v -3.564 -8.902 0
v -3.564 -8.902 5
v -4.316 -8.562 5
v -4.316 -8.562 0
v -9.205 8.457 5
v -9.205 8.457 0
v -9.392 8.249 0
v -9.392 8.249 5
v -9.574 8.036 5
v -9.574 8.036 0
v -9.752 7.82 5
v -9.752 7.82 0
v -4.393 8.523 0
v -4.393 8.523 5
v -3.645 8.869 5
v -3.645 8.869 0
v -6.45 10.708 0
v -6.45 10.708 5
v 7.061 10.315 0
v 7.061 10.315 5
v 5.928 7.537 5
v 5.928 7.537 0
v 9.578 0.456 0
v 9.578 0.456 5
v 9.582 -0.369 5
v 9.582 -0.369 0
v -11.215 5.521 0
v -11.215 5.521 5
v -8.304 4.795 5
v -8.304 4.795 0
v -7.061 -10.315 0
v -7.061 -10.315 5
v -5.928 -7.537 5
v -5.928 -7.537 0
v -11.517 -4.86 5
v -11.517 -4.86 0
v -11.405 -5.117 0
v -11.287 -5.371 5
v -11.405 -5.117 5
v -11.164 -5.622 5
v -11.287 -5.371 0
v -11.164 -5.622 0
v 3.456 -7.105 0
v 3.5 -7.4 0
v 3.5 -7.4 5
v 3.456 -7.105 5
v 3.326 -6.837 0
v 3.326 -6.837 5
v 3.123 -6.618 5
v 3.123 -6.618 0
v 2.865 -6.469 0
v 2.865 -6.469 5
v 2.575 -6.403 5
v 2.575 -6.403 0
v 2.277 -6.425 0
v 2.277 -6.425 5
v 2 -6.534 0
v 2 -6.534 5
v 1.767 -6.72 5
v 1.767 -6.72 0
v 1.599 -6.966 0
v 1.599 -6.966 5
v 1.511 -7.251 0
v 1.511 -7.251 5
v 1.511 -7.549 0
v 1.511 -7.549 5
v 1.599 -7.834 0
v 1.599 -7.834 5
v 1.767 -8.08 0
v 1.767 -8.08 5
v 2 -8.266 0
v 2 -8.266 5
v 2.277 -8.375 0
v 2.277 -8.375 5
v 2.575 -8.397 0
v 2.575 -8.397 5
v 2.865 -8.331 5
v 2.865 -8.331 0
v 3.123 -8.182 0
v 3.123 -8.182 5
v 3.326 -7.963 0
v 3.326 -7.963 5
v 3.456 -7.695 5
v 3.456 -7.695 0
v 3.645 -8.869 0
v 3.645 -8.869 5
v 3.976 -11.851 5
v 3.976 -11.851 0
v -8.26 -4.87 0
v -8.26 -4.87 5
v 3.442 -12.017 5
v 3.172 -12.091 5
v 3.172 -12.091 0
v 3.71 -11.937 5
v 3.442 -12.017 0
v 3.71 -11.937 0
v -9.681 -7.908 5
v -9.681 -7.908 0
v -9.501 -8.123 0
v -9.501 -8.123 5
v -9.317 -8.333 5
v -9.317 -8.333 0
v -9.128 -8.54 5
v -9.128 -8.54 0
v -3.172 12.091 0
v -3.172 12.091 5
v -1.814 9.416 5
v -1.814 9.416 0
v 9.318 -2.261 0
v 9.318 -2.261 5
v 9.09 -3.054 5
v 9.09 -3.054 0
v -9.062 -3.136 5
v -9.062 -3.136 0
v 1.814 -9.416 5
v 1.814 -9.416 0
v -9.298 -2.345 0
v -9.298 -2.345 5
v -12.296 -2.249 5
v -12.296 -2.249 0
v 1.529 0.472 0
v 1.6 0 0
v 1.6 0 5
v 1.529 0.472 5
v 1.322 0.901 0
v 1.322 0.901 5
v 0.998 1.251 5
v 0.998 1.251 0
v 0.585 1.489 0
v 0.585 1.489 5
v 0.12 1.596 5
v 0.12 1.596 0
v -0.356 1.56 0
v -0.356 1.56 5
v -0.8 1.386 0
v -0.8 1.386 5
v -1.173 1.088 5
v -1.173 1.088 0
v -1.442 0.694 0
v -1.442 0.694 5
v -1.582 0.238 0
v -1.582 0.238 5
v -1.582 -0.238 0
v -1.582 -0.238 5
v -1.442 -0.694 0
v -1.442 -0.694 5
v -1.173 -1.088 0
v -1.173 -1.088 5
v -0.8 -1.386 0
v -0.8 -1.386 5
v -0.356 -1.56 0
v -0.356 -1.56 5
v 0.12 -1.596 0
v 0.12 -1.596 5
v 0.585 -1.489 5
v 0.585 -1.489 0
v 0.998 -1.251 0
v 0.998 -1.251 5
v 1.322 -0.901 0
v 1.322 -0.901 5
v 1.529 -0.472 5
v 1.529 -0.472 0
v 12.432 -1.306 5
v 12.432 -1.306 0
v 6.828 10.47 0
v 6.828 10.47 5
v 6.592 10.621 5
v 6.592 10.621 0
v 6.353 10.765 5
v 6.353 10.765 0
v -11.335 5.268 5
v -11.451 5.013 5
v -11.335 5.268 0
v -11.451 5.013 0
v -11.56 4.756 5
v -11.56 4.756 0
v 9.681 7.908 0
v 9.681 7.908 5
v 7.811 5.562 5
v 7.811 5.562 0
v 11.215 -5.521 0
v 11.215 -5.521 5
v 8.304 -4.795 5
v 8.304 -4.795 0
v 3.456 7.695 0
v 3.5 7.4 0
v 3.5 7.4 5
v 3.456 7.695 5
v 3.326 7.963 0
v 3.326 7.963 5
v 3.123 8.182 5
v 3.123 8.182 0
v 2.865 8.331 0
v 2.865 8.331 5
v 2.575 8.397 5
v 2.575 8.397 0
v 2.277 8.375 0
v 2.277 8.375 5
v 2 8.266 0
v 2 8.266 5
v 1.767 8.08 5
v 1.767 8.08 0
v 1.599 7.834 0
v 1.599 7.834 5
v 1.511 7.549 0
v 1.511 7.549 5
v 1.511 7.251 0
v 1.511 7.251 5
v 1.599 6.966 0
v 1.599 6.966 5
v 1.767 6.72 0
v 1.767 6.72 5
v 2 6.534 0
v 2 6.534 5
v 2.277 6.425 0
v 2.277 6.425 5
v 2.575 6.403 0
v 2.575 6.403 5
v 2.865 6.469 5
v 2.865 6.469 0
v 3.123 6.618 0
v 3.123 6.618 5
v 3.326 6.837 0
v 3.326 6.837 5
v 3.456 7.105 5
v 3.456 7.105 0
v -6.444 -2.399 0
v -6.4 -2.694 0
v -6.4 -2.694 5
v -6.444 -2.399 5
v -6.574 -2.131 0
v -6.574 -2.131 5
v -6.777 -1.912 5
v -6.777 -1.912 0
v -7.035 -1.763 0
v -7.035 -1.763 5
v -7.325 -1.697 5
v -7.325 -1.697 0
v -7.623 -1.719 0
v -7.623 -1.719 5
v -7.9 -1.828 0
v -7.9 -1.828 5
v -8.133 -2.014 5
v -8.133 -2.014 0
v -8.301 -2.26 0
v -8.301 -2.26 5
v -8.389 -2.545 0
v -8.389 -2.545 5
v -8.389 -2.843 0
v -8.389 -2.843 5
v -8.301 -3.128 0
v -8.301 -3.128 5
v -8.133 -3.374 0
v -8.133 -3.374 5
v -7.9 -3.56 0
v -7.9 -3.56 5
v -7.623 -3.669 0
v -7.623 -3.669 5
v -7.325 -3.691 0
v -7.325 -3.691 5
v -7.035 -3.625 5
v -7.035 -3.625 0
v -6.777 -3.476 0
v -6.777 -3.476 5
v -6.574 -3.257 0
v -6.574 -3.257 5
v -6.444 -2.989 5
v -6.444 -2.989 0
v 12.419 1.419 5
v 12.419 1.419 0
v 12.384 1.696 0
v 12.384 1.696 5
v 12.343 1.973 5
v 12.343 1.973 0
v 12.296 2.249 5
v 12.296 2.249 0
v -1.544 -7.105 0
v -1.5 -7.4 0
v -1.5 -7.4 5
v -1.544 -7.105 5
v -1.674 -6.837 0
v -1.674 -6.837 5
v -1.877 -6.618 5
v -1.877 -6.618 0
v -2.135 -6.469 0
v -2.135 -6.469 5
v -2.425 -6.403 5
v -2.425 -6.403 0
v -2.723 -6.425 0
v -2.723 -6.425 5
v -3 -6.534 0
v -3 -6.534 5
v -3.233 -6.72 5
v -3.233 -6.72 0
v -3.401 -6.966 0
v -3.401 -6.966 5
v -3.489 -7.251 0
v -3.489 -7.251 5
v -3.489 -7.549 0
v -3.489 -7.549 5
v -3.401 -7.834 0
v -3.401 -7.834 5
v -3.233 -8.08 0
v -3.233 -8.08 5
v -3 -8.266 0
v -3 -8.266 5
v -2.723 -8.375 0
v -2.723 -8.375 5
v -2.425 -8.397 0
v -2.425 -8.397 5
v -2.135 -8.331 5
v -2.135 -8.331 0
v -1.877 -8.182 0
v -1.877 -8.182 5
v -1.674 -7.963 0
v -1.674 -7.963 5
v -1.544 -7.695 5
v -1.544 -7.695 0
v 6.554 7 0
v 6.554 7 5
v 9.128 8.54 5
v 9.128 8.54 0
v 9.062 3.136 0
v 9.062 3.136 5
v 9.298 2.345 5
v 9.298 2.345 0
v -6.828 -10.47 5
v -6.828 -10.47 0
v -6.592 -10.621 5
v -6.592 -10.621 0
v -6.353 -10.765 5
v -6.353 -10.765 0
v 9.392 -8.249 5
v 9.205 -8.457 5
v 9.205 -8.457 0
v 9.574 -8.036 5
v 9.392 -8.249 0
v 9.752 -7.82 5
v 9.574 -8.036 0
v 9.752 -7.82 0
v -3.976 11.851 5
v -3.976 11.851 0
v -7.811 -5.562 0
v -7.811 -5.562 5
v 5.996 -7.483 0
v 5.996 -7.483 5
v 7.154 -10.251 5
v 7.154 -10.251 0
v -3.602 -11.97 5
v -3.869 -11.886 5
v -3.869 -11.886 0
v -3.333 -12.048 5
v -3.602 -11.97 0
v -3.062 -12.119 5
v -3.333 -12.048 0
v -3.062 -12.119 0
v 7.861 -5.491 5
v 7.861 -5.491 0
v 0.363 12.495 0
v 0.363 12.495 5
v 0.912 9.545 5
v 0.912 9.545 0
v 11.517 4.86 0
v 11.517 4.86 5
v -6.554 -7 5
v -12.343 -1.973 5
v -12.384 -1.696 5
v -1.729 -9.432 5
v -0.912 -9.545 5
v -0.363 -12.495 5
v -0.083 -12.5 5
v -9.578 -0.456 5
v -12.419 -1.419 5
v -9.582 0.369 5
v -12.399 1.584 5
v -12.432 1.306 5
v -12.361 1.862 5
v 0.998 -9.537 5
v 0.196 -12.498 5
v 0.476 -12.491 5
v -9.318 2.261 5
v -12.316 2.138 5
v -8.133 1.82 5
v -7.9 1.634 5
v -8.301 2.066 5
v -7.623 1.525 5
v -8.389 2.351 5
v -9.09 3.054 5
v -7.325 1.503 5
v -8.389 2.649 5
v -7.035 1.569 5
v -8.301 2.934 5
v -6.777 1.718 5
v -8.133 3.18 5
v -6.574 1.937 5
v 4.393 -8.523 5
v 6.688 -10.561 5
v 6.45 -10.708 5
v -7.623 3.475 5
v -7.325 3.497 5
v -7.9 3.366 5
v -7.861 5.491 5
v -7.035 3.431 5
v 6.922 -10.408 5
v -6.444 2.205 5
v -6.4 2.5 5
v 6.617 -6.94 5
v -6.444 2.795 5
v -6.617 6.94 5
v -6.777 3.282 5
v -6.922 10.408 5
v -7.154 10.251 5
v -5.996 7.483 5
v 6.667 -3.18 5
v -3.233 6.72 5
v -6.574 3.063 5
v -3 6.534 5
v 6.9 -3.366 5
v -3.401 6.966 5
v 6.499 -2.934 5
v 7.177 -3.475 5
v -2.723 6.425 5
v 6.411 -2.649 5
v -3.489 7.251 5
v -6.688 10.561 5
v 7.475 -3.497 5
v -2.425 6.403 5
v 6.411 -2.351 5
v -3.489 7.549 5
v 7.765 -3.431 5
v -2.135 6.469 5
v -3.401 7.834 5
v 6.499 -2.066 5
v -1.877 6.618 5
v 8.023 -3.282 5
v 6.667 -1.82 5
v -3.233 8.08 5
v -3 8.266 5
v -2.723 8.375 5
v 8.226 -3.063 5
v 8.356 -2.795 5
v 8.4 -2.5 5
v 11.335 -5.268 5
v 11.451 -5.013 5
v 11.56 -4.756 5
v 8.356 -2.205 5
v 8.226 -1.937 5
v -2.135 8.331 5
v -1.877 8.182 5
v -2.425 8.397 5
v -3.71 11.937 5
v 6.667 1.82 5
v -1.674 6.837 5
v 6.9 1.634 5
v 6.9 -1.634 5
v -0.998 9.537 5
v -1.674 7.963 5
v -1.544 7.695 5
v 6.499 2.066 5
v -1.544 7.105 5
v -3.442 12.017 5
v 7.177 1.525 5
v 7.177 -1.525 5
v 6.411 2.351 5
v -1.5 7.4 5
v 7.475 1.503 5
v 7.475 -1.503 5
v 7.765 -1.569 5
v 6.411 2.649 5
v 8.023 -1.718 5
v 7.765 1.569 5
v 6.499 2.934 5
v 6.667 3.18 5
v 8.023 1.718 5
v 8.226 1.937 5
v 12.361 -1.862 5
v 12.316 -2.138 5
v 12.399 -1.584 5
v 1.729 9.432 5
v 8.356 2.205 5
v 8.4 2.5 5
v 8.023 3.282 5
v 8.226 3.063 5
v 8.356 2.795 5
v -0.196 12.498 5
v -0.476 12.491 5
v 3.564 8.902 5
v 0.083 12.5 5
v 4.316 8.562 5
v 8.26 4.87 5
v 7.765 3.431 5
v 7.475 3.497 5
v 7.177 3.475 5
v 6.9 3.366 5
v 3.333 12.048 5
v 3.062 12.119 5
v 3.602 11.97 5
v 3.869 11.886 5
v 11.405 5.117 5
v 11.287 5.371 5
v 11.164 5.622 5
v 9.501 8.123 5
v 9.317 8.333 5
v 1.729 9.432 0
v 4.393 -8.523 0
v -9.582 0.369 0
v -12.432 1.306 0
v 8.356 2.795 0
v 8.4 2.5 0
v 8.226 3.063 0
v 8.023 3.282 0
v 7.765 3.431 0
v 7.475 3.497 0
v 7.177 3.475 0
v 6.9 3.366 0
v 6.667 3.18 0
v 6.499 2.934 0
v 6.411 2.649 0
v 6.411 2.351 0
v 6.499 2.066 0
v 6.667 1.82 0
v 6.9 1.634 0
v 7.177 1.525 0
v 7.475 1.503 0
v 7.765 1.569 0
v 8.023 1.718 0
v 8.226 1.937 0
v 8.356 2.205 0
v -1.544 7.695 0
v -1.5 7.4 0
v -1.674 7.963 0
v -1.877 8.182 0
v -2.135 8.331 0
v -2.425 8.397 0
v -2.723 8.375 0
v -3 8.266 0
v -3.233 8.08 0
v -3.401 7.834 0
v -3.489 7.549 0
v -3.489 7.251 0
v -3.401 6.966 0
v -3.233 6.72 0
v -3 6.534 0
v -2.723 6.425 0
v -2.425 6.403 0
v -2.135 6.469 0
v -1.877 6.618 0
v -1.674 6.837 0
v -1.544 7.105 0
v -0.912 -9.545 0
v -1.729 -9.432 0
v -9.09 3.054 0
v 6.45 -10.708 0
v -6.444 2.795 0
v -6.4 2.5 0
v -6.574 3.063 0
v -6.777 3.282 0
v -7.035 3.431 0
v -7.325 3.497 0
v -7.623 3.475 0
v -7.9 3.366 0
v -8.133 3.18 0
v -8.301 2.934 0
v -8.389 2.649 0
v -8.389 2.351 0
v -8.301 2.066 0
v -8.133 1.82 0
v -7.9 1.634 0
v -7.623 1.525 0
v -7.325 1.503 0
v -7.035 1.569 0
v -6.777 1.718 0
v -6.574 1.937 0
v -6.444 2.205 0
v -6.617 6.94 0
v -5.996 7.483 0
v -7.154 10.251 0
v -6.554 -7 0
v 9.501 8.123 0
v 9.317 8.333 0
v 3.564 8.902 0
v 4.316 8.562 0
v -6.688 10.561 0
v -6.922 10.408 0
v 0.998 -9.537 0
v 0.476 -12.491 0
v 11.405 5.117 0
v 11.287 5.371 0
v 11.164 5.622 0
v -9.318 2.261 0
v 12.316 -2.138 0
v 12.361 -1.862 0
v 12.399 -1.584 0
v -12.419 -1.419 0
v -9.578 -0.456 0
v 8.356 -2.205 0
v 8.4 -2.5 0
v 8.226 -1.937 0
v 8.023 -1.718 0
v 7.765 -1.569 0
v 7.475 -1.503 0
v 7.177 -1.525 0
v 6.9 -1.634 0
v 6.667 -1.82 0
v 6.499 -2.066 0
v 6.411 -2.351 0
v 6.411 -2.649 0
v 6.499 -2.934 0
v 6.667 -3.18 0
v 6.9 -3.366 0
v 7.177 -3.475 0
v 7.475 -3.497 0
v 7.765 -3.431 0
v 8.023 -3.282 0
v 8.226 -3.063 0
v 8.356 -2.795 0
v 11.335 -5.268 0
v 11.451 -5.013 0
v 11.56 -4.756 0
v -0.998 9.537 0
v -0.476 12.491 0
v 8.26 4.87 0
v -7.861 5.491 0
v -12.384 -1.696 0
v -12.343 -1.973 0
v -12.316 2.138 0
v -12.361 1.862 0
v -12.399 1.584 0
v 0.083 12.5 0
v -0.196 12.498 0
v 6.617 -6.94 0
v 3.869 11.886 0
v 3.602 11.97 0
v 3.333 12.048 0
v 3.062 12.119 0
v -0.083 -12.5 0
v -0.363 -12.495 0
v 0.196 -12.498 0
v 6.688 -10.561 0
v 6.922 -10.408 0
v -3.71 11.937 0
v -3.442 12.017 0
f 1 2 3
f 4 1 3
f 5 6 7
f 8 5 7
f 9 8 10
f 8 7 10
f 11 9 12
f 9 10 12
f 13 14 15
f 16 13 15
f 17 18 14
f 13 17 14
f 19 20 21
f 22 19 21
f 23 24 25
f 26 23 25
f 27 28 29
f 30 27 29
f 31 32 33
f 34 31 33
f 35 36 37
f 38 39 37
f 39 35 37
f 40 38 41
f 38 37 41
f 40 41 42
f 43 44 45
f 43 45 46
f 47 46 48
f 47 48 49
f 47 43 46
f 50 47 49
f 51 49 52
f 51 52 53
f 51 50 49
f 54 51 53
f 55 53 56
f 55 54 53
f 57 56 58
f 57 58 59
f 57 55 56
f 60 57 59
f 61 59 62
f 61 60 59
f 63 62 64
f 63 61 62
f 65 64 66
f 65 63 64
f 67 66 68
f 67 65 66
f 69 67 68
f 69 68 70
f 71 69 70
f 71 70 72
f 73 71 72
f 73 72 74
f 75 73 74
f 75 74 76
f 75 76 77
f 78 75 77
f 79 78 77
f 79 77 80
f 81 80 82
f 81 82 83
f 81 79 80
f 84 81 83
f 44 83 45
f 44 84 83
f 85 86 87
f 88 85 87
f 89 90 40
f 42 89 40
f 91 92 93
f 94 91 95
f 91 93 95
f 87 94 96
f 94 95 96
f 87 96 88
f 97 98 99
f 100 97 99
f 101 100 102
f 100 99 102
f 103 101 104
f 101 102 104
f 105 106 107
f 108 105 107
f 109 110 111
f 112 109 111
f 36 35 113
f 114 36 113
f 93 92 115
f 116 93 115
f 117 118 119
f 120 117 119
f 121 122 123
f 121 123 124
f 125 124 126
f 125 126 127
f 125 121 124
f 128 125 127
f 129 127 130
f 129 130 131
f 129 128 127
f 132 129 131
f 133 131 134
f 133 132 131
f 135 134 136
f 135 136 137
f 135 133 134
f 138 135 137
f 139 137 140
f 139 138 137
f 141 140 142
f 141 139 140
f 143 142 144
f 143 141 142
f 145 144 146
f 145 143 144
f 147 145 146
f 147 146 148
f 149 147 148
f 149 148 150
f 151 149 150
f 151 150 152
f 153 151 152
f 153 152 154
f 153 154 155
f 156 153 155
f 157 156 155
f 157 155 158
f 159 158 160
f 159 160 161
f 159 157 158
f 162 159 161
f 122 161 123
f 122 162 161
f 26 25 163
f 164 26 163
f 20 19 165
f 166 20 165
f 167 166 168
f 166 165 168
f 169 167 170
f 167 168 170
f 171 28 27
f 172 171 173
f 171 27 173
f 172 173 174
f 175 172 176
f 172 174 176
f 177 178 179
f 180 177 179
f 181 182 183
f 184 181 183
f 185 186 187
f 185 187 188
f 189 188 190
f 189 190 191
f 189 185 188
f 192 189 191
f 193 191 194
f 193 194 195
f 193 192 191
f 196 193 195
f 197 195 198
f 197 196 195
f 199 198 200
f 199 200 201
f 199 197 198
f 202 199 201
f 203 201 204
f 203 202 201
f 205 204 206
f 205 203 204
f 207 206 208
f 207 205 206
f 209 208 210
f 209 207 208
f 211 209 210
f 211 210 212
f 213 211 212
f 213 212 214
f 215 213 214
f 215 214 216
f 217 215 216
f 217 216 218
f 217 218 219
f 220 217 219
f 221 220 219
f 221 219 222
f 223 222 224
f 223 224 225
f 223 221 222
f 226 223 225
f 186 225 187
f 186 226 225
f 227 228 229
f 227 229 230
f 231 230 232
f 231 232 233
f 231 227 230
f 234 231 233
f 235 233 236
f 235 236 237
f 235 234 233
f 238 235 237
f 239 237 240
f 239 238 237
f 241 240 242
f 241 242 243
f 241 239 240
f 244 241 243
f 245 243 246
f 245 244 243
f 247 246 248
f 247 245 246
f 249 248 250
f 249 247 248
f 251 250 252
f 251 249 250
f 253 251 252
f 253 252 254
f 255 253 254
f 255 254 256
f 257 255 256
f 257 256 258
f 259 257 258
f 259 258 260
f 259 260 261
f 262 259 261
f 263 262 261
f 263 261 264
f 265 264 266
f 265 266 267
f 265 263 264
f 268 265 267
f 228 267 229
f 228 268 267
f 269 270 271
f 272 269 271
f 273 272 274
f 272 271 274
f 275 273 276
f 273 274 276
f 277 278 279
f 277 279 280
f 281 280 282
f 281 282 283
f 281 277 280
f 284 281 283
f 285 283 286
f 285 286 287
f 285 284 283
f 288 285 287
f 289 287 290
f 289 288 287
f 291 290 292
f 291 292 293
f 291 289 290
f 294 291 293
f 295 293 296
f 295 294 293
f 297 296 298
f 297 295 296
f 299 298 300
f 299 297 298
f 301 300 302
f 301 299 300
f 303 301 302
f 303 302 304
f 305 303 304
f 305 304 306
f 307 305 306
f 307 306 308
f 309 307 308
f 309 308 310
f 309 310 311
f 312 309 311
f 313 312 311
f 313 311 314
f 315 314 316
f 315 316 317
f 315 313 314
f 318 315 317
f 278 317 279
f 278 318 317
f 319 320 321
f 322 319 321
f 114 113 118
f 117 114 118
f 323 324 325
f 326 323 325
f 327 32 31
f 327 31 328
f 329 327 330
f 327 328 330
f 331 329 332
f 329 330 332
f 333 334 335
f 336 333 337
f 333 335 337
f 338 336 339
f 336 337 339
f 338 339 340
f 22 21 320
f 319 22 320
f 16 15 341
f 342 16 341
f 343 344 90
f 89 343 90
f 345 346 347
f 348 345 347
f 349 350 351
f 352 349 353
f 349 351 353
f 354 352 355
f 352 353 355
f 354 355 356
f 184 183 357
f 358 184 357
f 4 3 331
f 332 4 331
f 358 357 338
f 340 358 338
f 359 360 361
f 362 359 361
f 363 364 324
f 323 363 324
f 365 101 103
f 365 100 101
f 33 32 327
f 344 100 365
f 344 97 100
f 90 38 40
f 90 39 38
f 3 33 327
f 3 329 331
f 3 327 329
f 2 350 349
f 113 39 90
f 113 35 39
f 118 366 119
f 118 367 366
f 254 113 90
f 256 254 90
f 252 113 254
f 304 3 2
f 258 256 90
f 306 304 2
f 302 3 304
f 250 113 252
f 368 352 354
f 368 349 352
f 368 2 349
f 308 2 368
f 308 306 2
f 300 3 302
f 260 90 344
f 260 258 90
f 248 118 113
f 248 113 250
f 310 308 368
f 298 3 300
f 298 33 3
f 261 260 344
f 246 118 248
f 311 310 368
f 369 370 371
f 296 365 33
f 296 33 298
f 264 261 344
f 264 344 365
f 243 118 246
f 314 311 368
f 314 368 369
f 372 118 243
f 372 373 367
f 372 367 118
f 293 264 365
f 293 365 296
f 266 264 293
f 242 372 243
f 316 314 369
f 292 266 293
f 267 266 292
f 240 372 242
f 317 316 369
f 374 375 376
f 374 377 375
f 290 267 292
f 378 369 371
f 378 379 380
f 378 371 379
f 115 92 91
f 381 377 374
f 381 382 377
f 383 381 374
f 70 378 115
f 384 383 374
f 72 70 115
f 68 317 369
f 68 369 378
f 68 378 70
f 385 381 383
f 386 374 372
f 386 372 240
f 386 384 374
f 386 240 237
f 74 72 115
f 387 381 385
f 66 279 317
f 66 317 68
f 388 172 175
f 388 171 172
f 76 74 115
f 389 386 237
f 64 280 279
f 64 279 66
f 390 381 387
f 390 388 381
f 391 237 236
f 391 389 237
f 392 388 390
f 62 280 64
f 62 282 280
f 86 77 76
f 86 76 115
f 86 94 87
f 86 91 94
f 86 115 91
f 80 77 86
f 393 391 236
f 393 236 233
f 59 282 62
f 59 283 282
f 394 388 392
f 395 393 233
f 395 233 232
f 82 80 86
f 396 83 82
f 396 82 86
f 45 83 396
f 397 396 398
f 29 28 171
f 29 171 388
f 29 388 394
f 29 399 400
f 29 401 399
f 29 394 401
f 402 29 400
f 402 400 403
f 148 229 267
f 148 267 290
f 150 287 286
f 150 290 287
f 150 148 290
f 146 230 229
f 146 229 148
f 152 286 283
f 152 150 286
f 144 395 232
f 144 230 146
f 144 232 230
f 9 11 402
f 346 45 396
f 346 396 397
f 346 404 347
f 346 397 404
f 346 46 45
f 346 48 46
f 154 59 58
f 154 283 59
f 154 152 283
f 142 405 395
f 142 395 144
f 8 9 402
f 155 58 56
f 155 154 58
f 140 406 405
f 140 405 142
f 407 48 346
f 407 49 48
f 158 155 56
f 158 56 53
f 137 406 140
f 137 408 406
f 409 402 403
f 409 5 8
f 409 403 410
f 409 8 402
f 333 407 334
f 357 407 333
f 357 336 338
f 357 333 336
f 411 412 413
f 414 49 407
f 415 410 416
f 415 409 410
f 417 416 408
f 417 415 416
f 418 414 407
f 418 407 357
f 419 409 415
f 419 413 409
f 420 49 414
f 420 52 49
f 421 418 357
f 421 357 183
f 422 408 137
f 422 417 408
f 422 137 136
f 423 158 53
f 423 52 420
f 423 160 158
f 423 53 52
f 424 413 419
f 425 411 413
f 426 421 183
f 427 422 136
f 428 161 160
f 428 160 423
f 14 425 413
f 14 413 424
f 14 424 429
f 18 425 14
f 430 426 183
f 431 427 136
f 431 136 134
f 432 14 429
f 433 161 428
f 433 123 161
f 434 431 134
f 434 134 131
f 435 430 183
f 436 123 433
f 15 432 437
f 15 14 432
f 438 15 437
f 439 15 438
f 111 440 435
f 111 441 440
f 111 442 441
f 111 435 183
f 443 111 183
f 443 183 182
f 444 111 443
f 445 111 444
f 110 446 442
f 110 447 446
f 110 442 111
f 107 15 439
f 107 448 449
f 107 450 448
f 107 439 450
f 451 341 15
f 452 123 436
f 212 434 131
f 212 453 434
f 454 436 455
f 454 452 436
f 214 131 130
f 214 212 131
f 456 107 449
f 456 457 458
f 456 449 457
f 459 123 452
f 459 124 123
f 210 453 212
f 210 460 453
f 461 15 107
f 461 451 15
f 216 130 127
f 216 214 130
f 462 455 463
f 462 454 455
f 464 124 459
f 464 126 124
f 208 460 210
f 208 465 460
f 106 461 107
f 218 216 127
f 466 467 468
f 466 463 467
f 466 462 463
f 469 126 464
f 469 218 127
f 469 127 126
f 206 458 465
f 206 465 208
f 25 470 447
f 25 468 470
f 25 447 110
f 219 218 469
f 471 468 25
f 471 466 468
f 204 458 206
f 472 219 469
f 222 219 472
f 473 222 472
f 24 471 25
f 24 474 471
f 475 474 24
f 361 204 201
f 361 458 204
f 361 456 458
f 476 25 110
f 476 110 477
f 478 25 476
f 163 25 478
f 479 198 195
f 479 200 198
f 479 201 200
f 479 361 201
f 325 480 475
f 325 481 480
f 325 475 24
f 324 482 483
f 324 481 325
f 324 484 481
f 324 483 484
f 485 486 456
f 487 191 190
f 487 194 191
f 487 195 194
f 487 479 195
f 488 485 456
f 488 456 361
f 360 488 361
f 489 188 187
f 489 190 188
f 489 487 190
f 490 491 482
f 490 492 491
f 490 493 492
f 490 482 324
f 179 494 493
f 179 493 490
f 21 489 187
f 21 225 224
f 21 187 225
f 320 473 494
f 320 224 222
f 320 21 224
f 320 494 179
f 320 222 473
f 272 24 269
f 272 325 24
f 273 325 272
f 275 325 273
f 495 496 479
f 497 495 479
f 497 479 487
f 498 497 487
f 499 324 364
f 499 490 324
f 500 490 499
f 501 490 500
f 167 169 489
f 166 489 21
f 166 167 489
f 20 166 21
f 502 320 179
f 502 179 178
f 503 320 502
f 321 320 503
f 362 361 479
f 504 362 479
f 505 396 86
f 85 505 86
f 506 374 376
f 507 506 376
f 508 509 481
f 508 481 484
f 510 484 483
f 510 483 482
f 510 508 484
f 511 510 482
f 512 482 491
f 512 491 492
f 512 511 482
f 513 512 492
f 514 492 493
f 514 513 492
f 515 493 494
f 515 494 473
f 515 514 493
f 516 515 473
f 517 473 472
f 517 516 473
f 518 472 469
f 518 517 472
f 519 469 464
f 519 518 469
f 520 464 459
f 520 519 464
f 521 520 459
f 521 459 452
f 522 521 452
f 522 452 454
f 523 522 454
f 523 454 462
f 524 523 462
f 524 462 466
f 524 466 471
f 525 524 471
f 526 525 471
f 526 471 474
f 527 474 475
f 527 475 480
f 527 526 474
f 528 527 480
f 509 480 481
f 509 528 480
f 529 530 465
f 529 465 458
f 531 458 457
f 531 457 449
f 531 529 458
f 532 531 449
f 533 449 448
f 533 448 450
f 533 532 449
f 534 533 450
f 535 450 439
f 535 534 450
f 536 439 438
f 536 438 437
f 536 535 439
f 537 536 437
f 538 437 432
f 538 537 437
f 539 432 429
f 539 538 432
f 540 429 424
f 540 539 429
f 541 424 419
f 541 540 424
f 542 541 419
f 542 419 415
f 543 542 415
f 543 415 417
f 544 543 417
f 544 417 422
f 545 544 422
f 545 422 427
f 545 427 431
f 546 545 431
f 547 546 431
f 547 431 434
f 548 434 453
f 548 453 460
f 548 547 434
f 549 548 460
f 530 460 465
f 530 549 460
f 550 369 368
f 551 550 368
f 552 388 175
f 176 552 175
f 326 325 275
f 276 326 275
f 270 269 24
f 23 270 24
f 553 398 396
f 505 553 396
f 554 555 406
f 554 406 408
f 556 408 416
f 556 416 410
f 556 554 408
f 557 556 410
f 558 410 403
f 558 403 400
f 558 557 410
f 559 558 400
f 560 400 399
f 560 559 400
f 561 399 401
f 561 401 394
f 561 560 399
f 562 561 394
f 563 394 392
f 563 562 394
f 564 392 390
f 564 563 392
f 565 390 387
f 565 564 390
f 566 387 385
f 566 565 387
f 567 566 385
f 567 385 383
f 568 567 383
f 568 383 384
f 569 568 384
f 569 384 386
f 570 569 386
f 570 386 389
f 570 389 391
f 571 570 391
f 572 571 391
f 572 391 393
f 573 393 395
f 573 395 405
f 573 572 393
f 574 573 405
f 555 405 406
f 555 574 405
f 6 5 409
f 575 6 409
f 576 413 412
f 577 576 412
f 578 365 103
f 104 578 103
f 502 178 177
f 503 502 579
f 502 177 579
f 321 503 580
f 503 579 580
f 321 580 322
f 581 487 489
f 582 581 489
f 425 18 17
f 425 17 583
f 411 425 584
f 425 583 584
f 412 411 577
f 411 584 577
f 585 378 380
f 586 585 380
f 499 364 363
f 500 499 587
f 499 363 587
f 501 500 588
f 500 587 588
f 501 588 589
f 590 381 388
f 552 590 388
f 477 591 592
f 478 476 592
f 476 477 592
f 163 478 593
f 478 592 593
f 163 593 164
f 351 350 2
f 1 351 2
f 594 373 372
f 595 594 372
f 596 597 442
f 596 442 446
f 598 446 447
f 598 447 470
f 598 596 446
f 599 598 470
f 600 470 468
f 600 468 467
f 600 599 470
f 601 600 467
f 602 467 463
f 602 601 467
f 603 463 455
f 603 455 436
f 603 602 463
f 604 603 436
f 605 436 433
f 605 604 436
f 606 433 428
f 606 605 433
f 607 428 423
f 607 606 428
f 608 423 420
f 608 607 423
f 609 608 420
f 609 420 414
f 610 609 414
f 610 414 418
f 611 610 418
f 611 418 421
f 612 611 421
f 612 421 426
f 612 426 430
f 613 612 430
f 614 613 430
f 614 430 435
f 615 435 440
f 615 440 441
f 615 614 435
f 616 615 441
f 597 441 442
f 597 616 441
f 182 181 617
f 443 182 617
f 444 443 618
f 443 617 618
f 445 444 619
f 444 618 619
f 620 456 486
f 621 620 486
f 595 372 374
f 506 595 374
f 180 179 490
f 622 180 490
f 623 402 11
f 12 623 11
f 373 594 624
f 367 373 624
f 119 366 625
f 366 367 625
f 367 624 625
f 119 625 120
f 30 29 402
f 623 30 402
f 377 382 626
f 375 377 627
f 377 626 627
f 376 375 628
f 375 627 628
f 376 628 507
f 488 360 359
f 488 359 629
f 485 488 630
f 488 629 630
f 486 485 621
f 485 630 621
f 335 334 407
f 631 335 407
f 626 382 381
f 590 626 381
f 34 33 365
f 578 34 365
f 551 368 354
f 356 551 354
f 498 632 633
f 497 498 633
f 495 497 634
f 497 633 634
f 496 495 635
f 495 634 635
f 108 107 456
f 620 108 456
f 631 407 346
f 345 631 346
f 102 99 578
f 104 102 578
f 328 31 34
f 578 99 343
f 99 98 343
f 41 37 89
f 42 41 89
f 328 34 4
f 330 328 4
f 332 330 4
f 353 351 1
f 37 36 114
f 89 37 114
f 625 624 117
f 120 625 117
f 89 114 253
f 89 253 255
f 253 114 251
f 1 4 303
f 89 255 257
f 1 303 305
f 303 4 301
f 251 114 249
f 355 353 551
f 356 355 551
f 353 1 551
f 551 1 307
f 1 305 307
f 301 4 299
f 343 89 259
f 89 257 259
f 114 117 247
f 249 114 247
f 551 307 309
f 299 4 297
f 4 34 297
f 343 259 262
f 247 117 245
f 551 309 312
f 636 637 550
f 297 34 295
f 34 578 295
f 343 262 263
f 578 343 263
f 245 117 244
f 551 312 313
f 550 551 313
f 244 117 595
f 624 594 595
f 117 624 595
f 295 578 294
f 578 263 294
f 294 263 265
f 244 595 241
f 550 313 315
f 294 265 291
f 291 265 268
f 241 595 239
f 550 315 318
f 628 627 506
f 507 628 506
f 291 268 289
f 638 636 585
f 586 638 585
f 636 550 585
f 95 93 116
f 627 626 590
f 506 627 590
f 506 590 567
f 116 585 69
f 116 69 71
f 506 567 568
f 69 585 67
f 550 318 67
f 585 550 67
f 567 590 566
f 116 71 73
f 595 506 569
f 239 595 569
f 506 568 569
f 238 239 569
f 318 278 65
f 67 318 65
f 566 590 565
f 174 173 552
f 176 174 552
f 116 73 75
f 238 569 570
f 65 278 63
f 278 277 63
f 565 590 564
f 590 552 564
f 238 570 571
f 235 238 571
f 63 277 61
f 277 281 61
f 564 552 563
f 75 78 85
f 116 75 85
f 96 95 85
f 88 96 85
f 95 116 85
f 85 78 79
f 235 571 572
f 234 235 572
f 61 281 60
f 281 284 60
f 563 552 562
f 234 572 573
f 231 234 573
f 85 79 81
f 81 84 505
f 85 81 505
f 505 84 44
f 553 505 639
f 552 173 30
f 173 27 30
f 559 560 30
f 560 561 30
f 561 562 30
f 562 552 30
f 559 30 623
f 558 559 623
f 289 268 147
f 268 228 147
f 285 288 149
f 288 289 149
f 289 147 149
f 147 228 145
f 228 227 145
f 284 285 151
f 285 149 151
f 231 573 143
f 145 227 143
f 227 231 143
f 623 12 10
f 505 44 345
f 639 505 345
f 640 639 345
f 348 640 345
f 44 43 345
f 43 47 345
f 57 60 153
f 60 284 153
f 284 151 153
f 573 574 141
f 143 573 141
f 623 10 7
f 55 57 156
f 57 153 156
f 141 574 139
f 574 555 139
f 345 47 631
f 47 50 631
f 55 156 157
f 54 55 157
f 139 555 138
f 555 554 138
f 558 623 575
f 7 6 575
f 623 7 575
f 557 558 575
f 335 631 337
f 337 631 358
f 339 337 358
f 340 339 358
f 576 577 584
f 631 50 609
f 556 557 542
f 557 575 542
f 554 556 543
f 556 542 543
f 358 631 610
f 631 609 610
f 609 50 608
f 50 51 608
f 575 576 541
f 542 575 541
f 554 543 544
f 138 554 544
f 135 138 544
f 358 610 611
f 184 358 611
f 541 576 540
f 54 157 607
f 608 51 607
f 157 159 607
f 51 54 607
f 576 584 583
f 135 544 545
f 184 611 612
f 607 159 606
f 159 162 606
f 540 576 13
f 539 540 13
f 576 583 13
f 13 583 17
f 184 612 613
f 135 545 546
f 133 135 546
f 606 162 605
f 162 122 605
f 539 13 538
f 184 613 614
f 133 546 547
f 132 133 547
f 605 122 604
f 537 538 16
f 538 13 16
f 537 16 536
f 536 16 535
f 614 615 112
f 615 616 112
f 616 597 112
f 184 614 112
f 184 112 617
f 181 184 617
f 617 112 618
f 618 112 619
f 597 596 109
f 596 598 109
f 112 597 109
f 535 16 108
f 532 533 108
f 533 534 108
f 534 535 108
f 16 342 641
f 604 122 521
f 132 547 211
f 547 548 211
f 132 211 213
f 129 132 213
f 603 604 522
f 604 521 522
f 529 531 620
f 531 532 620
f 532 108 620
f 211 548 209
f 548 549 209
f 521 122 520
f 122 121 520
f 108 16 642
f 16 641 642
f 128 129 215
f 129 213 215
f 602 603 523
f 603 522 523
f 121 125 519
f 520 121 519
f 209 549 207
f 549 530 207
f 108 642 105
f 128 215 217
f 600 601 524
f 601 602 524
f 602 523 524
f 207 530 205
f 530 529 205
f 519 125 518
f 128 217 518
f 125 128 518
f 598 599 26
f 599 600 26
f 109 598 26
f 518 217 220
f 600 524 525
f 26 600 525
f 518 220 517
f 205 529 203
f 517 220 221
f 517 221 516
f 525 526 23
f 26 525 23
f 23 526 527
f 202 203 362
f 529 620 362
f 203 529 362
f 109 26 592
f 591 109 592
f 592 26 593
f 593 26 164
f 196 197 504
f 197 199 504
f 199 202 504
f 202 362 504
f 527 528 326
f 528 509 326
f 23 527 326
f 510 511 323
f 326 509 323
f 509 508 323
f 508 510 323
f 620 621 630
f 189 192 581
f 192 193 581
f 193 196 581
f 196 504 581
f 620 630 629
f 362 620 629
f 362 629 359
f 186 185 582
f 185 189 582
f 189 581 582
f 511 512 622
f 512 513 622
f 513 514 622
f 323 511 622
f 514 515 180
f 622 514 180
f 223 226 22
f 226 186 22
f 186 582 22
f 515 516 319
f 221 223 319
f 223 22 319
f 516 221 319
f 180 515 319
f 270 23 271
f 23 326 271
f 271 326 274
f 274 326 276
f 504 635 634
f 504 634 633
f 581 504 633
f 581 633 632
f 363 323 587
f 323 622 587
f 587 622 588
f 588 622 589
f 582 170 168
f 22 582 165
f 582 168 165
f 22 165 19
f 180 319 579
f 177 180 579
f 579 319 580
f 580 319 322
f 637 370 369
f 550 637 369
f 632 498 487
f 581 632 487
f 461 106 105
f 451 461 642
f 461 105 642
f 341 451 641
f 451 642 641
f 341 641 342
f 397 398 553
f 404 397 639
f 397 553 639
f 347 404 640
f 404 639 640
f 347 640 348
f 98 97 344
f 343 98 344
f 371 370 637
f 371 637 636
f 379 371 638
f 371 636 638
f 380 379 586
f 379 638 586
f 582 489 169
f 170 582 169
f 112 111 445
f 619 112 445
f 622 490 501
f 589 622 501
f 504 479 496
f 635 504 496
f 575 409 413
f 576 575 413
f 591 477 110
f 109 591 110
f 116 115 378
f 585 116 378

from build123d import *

# Parameters (mm, degrees)
SKETCH1_R           = 12.5
SKETCH1_R_2         = 1.6
SKETCH1_R_3         = 1
BOSS_EXTRUDE1_DEPTH = 5
CUT_EXTRUDE1_DEPTH  = 6
CIRPATTERN1_COUNT   = 22


with BuildPart() as part:
    # Sketch1 → Boss-Extrude1 (new body)
    with BuildSketch(Plane.XY):
        Circle(SKETCH1_R)
        Circle(SKETCH1_R_2, mode=Mode.SUBTRACT)
        with Locations((2.5, -7.4)):
            Circle(SKETCH1_R_3, mode=Mode.SUBTRACT)
        with Locations((-2.5, -7.4)):
            Circle(SKETCH1_R_3, mode=Mode.SUBTRACT)
        with Locations((7.4, -2.5)):
            Circle(SKETCH1_R_3, mode=Mode.SUBTRACT)
        with Locations((-7.4, -2.694035424)):
            Circle(SKETCH1_R_3, mode=Mode.SUBTRACT)
        with Locations((-7.4, 2.5)):
            Circle(SKETCH1_R_3, mode=Mode.SUBTRACT)
        with Locations((-2.5, 7.4)):
            Circle(SKETCH1_R_3, mode=Mode.SUBTRACT)
        with Locations((2.5, 7.4)):
            Circle(SKETCH1_R_3, mode=Mode.SUBTRACT)
        with Locations((7.4, 2.5)):
            Circle(SKETCH1_R_3, mode=Mode.SUBTRACT)
    extrude(amount=BOSS_EXTRUDE1_DEPTH)

    # Sketch2 → Cut-Extrude1 (cut, through all)
    with BuildSketch(Plane.XY.offset(5)):
        Polygon((-9.204992805, 8.456837911), (-6.616673599, 6.940063806), (-5.995627184, 7.483135026), (-7.153657676, 10.250618608), (-7.456074993, 10.596457577), (-9.507410122, 8.80267688), align=None)
    cut_extrude1 = extrude(amount=-CUT_EXTRUDE1_DEPTH, mode=Mode.SUBTRACT)

    # CirPattern1: Cut-Extrude1 ×22 about axis
    cirpattern1_axis = Axis((0, 0, 0), (0, 0, 1))
    for i in range(1, CIRPATTERN1_COUNT):
        add(cut_extrude1.rotate(cirpattern1_axis, i * 360 / CIRPATTERN1_COUNT), mode=Mode.SUBTRACT)


solid = part.part
